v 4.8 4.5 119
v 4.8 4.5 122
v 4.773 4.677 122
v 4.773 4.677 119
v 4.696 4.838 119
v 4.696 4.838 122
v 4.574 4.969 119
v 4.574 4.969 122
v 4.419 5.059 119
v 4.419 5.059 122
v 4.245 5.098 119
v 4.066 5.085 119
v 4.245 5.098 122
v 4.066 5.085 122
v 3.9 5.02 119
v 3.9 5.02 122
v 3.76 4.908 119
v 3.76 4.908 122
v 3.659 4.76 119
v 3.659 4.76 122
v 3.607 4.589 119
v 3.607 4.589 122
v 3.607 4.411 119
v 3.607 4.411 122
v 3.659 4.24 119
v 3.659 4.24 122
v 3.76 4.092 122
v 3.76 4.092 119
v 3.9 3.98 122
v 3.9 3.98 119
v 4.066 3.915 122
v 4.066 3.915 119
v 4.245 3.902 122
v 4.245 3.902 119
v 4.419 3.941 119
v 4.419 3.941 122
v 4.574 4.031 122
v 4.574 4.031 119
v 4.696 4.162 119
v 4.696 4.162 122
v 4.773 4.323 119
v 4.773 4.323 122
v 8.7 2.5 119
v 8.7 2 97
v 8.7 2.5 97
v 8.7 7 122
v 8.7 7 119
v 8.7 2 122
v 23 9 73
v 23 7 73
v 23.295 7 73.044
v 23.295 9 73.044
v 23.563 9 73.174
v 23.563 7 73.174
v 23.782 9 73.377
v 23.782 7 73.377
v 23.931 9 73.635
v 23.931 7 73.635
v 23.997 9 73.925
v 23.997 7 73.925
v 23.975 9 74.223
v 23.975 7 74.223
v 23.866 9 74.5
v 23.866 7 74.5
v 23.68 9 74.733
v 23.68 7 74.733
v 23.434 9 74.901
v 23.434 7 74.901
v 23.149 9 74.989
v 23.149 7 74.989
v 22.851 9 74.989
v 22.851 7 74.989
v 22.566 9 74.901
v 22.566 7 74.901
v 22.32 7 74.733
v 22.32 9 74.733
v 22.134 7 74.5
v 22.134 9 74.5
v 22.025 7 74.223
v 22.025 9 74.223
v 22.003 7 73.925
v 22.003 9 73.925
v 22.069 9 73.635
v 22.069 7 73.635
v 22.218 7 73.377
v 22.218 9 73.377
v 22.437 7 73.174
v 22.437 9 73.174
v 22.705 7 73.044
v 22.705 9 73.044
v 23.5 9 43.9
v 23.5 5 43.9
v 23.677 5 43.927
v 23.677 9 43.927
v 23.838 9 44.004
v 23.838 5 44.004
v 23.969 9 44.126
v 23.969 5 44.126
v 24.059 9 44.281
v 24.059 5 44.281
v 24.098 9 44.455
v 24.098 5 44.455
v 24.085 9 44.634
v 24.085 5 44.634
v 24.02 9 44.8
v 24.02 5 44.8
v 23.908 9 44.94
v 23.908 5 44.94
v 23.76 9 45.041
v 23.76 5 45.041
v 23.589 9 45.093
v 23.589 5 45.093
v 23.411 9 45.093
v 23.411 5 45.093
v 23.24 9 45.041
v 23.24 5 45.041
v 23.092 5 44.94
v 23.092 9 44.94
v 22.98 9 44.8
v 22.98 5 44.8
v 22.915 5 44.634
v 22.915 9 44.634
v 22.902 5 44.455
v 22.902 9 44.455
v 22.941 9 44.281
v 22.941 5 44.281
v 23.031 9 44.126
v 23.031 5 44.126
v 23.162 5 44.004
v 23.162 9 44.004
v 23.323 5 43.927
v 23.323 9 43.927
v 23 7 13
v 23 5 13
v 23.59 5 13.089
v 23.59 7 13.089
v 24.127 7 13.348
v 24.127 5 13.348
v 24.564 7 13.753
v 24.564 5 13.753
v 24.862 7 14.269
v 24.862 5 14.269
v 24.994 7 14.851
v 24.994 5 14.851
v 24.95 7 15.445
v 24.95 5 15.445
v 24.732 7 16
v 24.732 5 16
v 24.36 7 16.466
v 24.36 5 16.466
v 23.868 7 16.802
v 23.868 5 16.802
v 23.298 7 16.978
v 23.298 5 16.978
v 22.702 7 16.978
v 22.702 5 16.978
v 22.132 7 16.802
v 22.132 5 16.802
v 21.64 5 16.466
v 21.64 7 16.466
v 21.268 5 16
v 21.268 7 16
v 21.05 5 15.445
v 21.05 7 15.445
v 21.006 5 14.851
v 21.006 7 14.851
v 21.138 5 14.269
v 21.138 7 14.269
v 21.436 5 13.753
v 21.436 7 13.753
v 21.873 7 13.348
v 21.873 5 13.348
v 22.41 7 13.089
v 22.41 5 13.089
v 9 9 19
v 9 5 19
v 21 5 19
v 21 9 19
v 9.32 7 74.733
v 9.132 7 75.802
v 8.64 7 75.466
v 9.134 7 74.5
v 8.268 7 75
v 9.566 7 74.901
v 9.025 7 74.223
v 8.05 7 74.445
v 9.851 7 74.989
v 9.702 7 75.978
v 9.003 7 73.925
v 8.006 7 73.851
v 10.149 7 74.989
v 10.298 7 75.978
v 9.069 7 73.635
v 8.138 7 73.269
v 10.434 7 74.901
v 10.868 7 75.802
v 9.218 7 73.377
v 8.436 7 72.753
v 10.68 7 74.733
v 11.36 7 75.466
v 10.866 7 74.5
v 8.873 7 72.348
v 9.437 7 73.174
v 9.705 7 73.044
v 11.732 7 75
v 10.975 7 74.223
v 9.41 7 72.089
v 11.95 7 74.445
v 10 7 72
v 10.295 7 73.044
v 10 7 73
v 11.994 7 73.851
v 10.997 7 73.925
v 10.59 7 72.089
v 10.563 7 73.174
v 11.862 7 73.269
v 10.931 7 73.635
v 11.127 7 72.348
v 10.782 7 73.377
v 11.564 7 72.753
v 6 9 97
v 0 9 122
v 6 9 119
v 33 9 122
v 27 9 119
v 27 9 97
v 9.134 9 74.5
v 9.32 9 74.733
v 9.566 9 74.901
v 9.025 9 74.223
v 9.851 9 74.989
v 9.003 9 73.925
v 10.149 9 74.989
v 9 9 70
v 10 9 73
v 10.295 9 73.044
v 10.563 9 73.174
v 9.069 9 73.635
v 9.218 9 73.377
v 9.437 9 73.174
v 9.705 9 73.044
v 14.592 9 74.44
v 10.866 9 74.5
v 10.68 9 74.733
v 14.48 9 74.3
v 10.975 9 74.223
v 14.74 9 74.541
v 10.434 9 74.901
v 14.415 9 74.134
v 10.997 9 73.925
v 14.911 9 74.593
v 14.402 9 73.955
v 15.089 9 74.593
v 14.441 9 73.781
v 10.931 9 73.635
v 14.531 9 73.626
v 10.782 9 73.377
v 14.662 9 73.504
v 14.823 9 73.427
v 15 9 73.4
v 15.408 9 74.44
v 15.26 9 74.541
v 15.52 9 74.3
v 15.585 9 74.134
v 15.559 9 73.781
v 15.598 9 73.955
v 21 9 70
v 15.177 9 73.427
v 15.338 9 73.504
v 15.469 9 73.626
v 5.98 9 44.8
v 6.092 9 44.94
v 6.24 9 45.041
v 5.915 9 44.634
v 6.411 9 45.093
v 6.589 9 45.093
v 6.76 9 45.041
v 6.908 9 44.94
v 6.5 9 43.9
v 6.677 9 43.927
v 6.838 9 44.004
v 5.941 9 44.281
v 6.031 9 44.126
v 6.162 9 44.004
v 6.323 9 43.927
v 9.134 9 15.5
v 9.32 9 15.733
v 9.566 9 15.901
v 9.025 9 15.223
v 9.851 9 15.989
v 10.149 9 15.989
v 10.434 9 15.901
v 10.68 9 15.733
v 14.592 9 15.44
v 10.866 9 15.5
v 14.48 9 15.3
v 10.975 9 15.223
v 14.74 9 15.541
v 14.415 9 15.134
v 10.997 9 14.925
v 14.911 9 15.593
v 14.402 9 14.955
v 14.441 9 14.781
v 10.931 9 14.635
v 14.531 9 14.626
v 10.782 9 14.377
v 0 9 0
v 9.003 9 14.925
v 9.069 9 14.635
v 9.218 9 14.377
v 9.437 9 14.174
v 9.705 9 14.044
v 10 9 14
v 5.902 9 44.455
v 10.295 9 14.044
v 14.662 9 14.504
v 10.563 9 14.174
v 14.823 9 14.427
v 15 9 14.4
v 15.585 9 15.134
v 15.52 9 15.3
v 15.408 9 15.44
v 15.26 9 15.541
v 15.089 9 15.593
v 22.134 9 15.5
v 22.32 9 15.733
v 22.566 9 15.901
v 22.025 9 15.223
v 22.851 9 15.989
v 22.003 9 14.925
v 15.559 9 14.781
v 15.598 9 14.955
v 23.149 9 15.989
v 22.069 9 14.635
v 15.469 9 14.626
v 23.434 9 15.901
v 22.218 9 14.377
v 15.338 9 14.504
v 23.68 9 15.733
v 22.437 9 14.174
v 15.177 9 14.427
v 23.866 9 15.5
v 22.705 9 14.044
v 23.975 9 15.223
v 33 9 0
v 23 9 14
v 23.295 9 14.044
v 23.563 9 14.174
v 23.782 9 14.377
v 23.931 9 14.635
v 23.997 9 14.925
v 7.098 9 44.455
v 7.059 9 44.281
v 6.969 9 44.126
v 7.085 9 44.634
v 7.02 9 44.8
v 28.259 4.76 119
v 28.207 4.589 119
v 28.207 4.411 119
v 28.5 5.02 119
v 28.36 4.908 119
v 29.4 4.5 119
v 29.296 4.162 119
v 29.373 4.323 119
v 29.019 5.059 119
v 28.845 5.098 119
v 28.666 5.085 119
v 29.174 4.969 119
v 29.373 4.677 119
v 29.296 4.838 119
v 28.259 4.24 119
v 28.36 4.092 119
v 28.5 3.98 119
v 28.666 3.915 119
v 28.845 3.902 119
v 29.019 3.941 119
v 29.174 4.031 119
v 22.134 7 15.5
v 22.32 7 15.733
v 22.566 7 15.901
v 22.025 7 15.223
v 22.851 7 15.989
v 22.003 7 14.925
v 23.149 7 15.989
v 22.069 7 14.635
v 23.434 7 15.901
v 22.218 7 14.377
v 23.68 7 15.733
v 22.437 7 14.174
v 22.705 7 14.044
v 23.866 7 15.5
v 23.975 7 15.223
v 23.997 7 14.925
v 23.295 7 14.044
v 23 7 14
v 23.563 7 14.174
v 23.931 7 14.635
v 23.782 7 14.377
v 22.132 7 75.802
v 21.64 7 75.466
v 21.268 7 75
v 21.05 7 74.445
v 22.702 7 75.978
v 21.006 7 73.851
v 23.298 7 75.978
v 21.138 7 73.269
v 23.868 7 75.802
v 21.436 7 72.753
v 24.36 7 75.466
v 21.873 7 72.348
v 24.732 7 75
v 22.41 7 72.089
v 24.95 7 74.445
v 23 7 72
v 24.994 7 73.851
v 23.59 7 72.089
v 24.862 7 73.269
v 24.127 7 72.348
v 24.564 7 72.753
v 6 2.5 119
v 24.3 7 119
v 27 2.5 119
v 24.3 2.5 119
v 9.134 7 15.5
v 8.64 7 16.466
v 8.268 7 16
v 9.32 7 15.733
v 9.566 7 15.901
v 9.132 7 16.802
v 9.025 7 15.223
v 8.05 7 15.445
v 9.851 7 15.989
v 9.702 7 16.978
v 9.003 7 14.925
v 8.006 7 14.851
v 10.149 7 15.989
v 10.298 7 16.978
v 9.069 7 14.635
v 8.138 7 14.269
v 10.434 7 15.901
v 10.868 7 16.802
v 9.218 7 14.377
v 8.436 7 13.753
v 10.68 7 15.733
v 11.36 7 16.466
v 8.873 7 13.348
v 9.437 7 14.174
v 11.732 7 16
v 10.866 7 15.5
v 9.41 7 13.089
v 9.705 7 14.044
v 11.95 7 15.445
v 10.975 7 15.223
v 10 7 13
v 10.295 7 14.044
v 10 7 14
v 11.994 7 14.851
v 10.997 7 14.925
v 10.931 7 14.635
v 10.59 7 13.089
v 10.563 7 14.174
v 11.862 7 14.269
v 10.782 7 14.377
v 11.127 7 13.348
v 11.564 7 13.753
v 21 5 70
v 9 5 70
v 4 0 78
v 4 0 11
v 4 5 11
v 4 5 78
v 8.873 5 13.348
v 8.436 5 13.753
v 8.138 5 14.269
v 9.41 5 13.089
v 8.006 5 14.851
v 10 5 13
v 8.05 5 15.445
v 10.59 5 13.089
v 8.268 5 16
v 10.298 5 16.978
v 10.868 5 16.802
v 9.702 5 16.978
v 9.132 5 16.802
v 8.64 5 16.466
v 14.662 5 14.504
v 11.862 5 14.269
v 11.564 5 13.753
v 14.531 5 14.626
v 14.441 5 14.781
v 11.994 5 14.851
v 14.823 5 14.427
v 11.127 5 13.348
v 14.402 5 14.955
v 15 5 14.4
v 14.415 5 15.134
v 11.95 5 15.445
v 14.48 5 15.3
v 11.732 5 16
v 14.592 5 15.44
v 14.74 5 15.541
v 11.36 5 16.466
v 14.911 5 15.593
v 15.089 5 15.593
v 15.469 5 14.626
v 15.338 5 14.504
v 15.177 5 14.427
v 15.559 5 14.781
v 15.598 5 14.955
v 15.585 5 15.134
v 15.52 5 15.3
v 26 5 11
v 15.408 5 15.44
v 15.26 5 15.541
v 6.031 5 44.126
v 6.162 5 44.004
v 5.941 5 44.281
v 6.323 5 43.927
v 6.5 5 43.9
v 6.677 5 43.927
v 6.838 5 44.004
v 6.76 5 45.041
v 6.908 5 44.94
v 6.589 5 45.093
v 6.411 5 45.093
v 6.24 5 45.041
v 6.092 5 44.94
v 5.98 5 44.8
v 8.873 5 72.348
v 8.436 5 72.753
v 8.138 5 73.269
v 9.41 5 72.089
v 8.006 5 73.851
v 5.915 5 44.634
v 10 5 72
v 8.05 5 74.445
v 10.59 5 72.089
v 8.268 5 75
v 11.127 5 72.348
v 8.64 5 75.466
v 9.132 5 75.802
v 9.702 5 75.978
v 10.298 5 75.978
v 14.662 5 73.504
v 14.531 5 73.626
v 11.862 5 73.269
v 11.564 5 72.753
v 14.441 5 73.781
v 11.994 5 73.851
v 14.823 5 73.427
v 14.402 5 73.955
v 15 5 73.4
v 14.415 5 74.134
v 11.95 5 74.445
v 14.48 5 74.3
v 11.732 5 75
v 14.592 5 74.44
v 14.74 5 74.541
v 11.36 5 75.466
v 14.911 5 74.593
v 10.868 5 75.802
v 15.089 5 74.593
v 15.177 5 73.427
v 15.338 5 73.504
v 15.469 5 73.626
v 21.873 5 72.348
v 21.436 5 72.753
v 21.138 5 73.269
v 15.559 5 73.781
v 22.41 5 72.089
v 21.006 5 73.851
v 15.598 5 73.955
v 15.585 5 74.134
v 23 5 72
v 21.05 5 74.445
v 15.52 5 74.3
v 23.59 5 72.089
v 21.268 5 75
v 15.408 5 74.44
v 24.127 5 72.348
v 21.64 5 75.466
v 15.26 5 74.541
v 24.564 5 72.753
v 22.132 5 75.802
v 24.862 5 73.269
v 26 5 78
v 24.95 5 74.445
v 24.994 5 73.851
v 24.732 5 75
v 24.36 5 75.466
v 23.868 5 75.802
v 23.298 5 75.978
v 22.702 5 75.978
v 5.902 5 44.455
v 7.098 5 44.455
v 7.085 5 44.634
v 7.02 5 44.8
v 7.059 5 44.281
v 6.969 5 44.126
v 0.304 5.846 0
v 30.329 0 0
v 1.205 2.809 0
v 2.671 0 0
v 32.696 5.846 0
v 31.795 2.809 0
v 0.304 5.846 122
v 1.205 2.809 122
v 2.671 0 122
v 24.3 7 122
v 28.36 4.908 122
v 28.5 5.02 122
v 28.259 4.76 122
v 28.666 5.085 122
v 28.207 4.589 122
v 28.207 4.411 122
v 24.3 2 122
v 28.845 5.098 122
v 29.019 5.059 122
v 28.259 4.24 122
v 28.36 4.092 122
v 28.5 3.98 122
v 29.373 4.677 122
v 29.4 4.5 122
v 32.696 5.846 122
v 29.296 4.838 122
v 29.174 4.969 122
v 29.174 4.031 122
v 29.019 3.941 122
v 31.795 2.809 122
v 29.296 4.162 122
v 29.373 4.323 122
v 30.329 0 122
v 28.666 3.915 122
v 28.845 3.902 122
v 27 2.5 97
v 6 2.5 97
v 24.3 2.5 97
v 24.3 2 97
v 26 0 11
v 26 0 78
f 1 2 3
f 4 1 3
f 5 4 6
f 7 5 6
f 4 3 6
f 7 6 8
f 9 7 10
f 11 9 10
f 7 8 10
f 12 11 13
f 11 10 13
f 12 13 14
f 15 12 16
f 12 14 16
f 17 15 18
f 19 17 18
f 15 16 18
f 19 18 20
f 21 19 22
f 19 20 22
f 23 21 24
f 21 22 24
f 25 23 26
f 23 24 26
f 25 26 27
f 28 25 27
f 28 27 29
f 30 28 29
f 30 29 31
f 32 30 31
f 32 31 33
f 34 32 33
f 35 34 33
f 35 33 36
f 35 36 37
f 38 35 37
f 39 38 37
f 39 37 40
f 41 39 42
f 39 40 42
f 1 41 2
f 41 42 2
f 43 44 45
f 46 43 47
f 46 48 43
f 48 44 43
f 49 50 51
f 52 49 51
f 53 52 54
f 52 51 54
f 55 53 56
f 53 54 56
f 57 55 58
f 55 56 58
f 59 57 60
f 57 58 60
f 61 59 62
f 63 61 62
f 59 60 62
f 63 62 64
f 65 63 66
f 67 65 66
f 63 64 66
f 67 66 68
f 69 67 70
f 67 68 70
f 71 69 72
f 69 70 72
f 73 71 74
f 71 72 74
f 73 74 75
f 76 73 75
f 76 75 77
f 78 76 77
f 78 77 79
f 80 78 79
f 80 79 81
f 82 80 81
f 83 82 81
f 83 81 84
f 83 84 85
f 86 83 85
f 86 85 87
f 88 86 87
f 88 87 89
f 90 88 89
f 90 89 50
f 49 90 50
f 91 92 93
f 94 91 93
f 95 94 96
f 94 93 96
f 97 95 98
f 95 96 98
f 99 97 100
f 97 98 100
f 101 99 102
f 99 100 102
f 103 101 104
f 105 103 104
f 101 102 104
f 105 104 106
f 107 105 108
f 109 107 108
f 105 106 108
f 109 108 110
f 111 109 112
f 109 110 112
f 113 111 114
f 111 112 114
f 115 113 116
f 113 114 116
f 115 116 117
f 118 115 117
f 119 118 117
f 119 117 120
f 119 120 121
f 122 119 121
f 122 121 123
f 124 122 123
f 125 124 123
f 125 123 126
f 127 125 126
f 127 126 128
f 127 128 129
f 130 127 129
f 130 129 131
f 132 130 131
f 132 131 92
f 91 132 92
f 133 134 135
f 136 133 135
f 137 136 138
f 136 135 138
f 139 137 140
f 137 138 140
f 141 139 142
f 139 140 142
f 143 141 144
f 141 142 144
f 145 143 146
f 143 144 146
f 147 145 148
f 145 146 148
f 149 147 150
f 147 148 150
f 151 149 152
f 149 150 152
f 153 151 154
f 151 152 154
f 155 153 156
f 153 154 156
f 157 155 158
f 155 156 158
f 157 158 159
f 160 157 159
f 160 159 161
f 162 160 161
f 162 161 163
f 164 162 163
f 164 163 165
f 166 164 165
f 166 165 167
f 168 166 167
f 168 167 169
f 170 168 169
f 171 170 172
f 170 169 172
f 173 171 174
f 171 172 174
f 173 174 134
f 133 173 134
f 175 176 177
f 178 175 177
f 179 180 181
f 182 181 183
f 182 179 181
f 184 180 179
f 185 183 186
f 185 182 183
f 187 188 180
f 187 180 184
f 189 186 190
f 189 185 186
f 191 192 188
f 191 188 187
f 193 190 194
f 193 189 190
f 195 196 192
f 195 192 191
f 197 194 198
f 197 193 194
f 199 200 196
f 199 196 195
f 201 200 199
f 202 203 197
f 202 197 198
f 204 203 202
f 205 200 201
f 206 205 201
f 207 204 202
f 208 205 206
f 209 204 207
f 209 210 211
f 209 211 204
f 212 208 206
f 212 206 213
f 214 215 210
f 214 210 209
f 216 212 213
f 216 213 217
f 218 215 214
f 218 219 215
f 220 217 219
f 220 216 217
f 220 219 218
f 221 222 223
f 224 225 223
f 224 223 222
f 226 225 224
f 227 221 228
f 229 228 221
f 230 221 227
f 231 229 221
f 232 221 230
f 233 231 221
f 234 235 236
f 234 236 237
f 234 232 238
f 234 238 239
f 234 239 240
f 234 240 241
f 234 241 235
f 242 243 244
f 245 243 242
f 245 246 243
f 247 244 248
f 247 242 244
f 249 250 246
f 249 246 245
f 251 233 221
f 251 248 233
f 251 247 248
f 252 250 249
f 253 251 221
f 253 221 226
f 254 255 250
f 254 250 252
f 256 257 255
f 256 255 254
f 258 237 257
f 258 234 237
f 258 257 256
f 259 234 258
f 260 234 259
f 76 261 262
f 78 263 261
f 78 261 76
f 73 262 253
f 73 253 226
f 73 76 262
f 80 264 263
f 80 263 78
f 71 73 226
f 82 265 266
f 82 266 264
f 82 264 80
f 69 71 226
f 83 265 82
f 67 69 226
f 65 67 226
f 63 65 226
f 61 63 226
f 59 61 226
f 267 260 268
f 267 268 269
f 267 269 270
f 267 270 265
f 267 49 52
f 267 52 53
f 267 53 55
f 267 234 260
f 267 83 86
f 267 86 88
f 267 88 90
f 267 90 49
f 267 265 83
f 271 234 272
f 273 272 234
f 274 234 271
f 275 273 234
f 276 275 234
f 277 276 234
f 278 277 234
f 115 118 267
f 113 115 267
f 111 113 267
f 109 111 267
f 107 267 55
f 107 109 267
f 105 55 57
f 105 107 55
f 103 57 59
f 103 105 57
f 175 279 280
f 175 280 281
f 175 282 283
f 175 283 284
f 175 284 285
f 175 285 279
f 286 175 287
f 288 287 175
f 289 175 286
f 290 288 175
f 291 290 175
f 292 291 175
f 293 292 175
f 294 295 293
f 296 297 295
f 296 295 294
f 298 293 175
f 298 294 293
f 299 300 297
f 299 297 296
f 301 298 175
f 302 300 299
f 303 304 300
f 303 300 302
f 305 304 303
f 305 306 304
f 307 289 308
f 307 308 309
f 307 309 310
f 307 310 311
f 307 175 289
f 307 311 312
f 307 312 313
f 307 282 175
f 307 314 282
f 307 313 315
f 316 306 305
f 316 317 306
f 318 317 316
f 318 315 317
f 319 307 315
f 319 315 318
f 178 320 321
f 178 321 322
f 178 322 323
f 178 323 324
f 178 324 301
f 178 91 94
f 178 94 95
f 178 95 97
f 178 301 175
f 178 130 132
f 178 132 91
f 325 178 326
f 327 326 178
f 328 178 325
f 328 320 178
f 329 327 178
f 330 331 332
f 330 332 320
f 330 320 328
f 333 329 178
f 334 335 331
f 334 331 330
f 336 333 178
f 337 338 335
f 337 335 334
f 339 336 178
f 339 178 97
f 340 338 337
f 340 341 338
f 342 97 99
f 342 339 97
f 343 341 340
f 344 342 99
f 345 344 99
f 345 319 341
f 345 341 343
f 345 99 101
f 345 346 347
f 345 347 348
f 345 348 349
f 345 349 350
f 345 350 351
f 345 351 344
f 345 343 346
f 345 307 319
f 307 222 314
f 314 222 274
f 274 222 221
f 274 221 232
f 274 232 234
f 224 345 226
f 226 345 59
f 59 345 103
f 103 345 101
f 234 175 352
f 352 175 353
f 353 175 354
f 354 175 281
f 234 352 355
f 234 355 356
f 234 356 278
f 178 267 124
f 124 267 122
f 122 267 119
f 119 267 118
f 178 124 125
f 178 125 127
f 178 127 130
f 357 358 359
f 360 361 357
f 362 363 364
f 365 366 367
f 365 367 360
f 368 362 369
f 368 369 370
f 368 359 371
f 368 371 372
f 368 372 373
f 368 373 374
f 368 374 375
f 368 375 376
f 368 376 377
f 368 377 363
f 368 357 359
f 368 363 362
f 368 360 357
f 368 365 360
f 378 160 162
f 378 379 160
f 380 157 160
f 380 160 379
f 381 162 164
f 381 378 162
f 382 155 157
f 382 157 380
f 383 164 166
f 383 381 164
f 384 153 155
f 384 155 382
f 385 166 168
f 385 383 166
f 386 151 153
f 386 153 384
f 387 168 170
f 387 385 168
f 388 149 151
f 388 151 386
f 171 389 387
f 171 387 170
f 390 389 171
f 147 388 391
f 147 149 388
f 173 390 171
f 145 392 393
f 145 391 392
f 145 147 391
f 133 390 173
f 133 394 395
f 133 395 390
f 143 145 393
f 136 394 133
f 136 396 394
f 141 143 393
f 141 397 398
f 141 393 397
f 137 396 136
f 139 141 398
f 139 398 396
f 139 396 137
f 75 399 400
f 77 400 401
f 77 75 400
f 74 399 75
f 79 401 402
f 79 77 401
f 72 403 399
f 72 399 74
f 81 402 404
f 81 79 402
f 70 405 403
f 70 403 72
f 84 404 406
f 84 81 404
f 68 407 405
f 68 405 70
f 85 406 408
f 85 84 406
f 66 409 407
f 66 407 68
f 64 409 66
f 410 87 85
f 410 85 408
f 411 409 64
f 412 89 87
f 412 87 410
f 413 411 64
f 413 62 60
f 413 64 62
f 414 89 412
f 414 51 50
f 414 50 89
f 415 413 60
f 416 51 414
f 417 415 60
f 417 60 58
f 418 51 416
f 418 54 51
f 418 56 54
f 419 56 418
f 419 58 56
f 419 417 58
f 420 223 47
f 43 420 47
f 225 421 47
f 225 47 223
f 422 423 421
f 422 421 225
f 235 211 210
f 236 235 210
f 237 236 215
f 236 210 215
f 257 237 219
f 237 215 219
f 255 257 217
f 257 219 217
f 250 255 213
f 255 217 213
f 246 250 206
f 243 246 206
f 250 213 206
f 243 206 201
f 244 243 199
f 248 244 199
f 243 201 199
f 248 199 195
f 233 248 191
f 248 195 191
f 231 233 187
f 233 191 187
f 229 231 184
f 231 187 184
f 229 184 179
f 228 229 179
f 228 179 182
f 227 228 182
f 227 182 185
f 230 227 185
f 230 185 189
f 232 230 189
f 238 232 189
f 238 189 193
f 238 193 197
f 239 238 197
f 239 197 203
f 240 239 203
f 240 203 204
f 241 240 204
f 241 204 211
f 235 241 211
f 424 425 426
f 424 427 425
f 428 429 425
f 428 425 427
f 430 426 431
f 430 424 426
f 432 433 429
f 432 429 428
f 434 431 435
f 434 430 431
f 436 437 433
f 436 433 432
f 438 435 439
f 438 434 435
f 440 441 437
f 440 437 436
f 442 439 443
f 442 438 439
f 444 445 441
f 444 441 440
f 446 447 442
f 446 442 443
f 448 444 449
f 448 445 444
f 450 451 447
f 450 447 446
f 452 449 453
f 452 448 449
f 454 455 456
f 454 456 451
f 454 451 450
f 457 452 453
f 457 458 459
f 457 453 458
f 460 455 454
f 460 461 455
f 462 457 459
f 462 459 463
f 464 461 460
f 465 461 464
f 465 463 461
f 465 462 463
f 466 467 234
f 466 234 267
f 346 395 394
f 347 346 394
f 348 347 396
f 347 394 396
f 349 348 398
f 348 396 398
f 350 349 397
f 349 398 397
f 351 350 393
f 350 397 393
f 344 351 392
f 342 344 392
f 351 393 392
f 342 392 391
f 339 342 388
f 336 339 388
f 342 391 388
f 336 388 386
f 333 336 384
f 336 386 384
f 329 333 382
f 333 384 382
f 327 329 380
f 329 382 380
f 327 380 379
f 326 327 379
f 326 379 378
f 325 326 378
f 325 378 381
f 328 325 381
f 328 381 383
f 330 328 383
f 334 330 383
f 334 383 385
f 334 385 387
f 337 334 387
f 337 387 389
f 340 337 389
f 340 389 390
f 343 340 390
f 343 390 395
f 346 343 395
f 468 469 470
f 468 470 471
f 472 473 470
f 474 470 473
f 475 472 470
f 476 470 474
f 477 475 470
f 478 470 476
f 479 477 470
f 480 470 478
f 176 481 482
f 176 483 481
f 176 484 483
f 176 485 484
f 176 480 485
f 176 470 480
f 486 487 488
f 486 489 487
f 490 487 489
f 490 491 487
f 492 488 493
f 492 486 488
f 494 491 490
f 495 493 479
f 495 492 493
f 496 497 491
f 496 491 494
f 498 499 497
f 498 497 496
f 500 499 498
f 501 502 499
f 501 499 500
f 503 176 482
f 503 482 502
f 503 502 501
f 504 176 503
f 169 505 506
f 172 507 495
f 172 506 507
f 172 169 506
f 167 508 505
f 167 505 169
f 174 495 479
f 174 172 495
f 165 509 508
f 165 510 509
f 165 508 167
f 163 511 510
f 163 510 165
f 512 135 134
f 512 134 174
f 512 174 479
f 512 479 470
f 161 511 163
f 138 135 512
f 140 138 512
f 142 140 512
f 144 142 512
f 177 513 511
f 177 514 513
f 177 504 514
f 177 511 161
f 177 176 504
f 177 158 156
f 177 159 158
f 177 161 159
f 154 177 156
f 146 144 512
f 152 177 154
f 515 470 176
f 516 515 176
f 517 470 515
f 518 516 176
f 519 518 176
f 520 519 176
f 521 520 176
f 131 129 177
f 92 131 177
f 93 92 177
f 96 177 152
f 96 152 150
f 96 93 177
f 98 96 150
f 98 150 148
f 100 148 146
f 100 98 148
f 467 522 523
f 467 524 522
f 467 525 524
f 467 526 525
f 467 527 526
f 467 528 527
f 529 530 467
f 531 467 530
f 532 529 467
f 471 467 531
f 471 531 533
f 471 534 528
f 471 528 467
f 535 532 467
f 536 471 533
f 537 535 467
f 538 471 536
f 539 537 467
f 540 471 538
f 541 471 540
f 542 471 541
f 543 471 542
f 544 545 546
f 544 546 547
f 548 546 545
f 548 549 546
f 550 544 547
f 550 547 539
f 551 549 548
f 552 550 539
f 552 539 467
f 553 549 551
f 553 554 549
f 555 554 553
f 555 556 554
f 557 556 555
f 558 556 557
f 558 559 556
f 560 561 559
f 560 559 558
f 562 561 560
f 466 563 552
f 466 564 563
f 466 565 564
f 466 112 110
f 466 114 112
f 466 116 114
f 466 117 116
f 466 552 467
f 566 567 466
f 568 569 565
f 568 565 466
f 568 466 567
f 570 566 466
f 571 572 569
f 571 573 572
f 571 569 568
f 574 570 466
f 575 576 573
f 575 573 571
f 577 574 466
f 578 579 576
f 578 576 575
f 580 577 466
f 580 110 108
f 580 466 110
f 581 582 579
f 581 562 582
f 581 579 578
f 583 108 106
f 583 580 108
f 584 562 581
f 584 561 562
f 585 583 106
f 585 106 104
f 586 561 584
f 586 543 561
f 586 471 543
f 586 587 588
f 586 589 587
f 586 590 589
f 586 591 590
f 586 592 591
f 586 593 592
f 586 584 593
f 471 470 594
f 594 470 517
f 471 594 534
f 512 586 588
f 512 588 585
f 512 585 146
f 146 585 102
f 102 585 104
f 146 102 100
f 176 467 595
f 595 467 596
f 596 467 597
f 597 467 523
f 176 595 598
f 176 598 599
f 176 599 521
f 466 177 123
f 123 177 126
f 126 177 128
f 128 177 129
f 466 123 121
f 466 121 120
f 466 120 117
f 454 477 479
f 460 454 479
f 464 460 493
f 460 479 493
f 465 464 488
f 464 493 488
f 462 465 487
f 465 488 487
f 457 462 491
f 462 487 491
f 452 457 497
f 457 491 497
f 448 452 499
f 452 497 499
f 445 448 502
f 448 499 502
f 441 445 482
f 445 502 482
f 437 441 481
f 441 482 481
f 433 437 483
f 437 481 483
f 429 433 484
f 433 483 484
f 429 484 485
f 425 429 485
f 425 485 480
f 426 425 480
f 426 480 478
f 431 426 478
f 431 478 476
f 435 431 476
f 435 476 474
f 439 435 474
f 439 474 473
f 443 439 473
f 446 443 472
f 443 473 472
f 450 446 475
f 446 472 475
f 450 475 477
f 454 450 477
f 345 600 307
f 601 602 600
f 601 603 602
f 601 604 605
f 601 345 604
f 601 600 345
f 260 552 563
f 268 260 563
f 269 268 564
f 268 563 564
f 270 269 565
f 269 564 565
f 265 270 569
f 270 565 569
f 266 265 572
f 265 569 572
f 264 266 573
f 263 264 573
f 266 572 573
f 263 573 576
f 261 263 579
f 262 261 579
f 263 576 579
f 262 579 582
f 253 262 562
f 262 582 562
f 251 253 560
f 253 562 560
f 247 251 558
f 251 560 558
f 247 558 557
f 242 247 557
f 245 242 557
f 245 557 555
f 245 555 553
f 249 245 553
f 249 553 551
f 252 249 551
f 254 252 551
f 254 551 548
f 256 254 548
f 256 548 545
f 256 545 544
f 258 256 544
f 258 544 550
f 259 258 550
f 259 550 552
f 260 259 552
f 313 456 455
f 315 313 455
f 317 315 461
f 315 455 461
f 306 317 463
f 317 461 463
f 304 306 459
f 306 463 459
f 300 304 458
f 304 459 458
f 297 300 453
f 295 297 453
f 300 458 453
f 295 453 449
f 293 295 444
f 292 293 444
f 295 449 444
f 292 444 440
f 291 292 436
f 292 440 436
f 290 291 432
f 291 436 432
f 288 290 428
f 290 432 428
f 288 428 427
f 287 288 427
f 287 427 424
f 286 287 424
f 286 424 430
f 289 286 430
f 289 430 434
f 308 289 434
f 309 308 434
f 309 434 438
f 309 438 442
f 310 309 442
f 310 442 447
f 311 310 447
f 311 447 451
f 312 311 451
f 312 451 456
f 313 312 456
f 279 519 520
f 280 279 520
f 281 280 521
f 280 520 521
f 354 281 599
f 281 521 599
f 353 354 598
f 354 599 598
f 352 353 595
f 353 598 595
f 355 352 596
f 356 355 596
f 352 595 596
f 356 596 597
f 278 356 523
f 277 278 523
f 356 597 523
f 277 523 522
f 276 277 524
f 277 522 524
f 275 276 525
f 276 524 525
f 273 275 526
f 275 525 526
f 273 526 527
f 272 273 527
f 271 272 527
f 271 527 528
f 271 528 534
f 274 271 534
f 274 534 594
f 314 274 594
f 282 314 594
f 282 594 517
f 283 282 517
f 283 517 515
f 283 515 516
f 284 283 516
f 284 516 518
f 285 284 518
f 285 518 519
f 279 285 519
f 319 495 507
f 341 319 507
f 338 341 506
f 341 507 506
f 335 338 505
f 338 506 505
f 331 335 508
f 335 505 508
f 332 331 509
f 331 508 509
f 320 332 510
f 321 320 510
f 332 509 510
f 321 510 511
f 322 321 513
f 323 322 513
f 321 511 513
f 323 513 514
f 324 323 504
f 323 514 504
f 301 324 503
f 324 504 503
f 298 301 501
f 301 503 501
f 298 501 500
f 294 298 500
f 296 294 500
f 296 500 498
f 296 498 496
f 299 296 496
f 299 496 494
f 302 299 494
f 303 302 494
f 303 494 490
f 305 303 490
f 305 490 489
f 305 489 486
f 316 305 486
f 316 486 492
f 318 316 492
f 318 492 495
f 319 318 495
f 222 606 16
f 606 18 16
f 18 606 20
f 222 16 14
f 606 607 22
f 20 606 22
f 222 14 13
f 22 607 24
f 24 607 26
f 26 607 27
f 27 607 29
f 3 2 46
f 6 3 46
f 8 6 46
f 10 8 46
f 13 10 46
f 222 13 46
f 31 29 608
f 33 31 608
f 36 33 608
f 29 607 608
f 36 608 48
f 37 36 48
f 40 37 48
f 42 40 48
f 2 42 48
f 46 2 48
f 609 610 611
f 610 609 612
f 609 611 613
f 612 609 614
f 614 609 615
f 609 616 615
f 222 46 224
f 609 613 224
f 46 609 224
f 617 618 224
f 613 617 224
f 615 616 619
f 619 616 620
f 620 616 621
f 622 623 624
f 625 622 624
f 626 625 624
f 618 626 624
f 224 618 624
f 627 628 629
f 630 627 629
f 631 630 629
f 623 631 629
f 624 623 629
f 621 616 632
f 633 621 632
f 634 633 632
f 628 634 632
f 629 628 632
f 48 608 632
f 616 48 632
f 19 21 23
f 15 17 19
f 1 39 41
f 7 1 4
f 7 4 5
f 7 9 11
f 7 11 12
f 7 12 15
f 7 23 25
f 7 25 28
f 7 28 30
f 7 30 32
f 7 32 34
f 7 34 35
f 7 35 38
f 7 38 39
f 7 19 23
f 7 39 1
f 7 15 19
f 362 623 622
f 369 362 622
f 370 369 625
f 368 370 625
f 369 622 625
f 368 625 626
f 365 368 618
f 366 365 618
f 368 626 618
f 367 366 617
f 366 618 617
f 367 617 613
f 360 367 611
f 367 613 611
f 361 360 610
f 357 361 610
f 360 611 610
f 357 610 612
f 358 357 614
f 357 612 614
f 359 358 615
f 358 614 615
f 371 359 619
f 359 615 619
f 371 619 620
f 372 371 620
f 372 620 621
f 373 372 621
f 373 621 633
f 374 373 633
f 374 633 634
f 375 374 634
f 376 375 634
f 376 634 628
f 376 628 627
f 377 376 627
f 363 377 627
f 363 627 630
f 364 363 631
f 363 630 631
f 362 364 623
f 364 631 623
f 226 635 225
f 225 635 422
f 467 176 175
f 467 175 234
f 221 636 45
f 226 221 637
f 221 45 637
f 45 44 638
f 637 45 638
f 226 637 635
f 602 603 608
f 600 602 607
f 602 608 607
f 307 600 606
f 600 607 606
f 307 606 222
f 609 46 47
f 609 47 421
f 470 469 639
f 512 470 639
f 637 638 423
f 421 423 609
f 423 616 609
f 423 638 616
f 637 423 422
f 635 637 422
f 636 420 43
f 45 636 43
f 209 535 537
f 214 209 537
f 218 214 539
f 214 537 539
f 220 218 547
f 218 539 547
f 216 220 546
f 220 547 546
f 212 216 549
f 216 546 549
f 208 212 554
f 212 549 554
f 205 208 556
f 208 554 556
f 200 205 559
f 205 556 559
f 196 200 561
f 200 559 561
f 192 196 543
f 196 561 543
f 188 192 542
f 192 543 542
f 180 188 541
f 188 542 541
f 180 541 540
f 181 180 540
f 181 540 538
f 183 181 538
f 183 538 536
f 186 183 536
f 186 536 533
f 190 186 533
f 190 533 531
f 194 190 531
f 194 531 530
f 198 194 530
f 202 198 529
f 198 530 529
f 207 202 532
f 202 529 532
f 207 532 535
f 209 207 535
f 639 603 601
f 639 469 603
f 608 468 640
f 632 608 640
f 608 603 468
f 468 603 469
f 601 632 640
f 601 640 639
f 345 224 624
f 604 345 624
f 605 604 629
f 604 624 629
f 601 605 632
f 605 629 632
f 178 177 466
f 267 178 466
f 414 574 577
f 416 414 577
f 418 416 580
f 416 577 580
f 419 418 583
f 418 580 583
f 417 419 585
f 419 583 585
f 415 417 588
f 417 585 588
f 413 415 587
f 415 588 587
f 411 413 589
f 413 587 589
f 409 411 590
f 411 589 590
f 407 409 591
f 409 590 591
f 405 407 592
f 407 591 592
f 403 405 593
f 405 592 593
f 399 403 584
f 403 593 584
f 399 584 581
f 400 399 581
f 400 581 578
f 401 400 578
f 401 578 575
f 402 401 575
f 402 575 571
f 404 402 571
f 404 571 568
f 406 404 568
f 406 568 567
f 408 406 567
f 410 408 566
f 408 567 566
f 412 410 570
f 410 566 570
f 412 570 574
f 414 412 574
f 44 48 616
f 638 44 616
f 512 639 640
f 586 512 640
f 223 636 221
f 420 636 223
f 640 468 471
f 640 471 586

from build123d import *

# Parameters (mm, degrees)
SKETCH_1_W          = 33
SKETCH_1_H          = 122
EXTRUDE_1_DEPTH     = 9
SKETCH_2_W          = 12
SKETCH_2_H          = 51
SKETCH_2_W_2        = 21
SKETCH_2_H_2        = 22
CUT_EXTRUDE_1_DEPTH = 127.70438035
SKETCH_2_2_W        = 21
SKETCH_2_2_H        = 22
EXTRUDE_2_DEPTH     = 2.5
SKETCH_3_W          = 22
SKETCH_3_H          = 67
CUT_EXTRUDE_2_DEPTH = 5
SKETCH_4_R          = 1
CUT_EXTRUDE_3_DEPTH = 127.483200466
SKETCH_4_3_R        = 2
CUT_EXTRUDE_4_DEPTH = 2
SKETCH_5_R          = 0.6
CUT_EXTRUDE_5_DEPTH = 127.483200466
SKETCH_6_OUTSIDE_W  = 60.34
SKETCH_6_OUTSIDE_H  = 36.34
SKETCH_6_OUTSIDE_R  = 16.5
CUT_EXTRUDE_6_DEPTH = 127.70438035
CUT_EXTRUDE_7_REACH = 128.704
SKETCH_7_W          = 15.6
SKETCH_7_H          = 5
SKETCH_7_3_R        = 0.6
CUT_EXTRUDE_8_DEPTH = 3


with BuildPart() as part:
    # 草图1 → 凸台-拉伸1 (new body)
    with BuildSketch(Plane(origin=(0, 0, 0), x_dir=(1, 0, 0), z_dir=(0, 1, 0))):
        with Locations((16.5, -61)):
            Rectangle(SKETCH_1_W, SKETCH_1_H)
    extrude(amount=EXTRUDE_1_DEPTH)

    # 草图2 → 切除-拉伸1 (cut, through all)
    with BuildSketch(Plane.XZ):
        with Locations((15, 44.5)):
            Rectangle(SKETCH_2_W, SKETCH_2_H)
        with Locations((16.5, 108)):
            Rectangle(SKETCH_2_W_2, SKETCH_2_H_2)
    extrude(amount=-CUT_EXTRUDE_1_DEPTH, mode=Mode.SUBTRACT)

    # 草图2<2> → 凸台-拉伸2 (add)
    with BuildSketch(Plane.XZ):
        with Locations((16.5, 108)):
            Rectangle(SKETCH_2_2_W, SKETCH_2_2_H)
    extrude(amount=-EXTRUDE_2_DEPTH)

    # 草图3 → 切除-拉伸2 (cut)
    with BuildSketch(Plane.XZ):
        with Locations((15, 44.5)):
            Rectangle(SKETCH_3_W, SKETCH_3_H)
    extrude(amount=-CUT_EXTRUDE_2_DEPTH, mode=Mode.SUBTRACT)

    # 草图4 → 切除-拉伸3 (cut, through all)
    with BuildSketch(Plane.XZ.offset(-5)):
        with Locations(Location((23, 74, 0), (0, 0, 270))):
            Circle(SKETCH_4_R)
        with Locations(Location((10, 74, 0), (0, 0, 270))):
            Circle(SKETCH_4_R)
        with Locations(Location((23, 15, 0), (0, 0, 270))):
            Circle(SKETCH_4_R)
        with Locations(Location((10, 15, 0), (0, 0, 270))):
            Circle(SKETCH_4_R)
    extrude(amount=-CUT_EXTRUDE_3_DEPTH, mode=Mode.SUBTRACT)

    # 草图4<3> → 切除-拉伸4 (cut)
    with BuildSketch(Plane.XZ.offset(-5)):
        with Locations(Location((10, 74, 0), (0, 0, 270))):
            Circle(SKETCH_4_3_R)
        with Locations(Location((23, 74, 0), (0, 0, 270))):
            Circle(SKETCH_4_3_R)
        with Locations(Location((23, 15, 0), (0, 0, 270))):
            Circle(SKETCH_4_3_R)
        with Locations(Location((10, 15, 0), (0, 0, 270))):
            Circle(SKETCH_4_3_R)
    extrude(amount=-CUT_EXTRUDE_4_DEPTH, mode=Mode.SUBTRACT)

    # 草图5 → 切除-拉伸5 (cut, through all)
    with BuildSketch(Plane.XZ.offset(-5)):
        with Locations(Location((15, 74, 0), (0, 0, 270))):
            Circle(SKETCH_5_R)
        with Locations(Location((6.5, 44.5, 0), (0, 0, 270))):
            Circle(SKETCH_5_R)
        with Locations(Location((23.5, 44.5, 0), (0, 0, 270))):
            Circle(SKETCH_5_R)
        with Locations(Location((15, 15, 0), (0, 0, 270))):
            Circle(SKETCH_5_R)
    extrude(amount=-CUT_EXTRUDE_5_DEPTH, mode=Mode.SUBTRACT)

    # 草图6 outside → 切除-拉伸6 (cut, through all)
    with BuildSketch(Plane.XY.offset(122)):
        with Locations((16.5, 4.5)):
            Rectangle(SKETCH_6_OUTSIDE_W, SKETCH_6_OUTSIDE_H)
        with Locations((16.5, 9)):
            Circle(SKETCH_6_OUTSIDE_R, mode=Mode.SUBTRACT)
    extrude(amount=-CUT_EXTRUDE_6_DEPTH, mode=Mode.SUBTRACT)

    # 切除-拉伸7: up to this face of the body (flat: up to its plane)
    cut_extrude_7_end = Plane(part.part.faces().sort_by_distance((16.5, 5.75, 97))[0])
    # 草图7 → 切除-拉伸7 (cut, up to the picked face)
    with BuildSketch(Plane.XY.offset(122), mode=Mode.PRIVATE) as cut_extrude_7_sk1:
        with Locations((16.5, 4.5)):
            Rectangle(SKETCH_7_W, SKETCH_7_H)
    cut_extrude_7_tool1 = split(extrude(cut_extrude_7_sk1.sketch, amount=-CUT_EXTRUDE_7_REACH, mode=Mode.PRIVATE), bisect_by=cut_extrude_7_end, keep=Keep.BOTH, mode=Mode.PRIVATE)
    add(cut_extrude_7_tool1.solids().sort_by(Axis((16.5, 4.5, 122), (0, 0, -1)))[0], mode=Mode.SUBTRACT)

    # 草图7<3> → 切除-拉伸8 (cut)
    with BuildSketch(Plane.XY.offset(122)):
        with Locations((4.2, 4.5)):
            Circle(SKETCH_7_3_R)
        with Locations((28.8, 4.5)):
            Circle(SKETCH_7_3_R)
    extrude(amount=-CUT_EXTRUDE_8_DEPTH, mode=Mode.SUBTRACT)


solid = part.part
